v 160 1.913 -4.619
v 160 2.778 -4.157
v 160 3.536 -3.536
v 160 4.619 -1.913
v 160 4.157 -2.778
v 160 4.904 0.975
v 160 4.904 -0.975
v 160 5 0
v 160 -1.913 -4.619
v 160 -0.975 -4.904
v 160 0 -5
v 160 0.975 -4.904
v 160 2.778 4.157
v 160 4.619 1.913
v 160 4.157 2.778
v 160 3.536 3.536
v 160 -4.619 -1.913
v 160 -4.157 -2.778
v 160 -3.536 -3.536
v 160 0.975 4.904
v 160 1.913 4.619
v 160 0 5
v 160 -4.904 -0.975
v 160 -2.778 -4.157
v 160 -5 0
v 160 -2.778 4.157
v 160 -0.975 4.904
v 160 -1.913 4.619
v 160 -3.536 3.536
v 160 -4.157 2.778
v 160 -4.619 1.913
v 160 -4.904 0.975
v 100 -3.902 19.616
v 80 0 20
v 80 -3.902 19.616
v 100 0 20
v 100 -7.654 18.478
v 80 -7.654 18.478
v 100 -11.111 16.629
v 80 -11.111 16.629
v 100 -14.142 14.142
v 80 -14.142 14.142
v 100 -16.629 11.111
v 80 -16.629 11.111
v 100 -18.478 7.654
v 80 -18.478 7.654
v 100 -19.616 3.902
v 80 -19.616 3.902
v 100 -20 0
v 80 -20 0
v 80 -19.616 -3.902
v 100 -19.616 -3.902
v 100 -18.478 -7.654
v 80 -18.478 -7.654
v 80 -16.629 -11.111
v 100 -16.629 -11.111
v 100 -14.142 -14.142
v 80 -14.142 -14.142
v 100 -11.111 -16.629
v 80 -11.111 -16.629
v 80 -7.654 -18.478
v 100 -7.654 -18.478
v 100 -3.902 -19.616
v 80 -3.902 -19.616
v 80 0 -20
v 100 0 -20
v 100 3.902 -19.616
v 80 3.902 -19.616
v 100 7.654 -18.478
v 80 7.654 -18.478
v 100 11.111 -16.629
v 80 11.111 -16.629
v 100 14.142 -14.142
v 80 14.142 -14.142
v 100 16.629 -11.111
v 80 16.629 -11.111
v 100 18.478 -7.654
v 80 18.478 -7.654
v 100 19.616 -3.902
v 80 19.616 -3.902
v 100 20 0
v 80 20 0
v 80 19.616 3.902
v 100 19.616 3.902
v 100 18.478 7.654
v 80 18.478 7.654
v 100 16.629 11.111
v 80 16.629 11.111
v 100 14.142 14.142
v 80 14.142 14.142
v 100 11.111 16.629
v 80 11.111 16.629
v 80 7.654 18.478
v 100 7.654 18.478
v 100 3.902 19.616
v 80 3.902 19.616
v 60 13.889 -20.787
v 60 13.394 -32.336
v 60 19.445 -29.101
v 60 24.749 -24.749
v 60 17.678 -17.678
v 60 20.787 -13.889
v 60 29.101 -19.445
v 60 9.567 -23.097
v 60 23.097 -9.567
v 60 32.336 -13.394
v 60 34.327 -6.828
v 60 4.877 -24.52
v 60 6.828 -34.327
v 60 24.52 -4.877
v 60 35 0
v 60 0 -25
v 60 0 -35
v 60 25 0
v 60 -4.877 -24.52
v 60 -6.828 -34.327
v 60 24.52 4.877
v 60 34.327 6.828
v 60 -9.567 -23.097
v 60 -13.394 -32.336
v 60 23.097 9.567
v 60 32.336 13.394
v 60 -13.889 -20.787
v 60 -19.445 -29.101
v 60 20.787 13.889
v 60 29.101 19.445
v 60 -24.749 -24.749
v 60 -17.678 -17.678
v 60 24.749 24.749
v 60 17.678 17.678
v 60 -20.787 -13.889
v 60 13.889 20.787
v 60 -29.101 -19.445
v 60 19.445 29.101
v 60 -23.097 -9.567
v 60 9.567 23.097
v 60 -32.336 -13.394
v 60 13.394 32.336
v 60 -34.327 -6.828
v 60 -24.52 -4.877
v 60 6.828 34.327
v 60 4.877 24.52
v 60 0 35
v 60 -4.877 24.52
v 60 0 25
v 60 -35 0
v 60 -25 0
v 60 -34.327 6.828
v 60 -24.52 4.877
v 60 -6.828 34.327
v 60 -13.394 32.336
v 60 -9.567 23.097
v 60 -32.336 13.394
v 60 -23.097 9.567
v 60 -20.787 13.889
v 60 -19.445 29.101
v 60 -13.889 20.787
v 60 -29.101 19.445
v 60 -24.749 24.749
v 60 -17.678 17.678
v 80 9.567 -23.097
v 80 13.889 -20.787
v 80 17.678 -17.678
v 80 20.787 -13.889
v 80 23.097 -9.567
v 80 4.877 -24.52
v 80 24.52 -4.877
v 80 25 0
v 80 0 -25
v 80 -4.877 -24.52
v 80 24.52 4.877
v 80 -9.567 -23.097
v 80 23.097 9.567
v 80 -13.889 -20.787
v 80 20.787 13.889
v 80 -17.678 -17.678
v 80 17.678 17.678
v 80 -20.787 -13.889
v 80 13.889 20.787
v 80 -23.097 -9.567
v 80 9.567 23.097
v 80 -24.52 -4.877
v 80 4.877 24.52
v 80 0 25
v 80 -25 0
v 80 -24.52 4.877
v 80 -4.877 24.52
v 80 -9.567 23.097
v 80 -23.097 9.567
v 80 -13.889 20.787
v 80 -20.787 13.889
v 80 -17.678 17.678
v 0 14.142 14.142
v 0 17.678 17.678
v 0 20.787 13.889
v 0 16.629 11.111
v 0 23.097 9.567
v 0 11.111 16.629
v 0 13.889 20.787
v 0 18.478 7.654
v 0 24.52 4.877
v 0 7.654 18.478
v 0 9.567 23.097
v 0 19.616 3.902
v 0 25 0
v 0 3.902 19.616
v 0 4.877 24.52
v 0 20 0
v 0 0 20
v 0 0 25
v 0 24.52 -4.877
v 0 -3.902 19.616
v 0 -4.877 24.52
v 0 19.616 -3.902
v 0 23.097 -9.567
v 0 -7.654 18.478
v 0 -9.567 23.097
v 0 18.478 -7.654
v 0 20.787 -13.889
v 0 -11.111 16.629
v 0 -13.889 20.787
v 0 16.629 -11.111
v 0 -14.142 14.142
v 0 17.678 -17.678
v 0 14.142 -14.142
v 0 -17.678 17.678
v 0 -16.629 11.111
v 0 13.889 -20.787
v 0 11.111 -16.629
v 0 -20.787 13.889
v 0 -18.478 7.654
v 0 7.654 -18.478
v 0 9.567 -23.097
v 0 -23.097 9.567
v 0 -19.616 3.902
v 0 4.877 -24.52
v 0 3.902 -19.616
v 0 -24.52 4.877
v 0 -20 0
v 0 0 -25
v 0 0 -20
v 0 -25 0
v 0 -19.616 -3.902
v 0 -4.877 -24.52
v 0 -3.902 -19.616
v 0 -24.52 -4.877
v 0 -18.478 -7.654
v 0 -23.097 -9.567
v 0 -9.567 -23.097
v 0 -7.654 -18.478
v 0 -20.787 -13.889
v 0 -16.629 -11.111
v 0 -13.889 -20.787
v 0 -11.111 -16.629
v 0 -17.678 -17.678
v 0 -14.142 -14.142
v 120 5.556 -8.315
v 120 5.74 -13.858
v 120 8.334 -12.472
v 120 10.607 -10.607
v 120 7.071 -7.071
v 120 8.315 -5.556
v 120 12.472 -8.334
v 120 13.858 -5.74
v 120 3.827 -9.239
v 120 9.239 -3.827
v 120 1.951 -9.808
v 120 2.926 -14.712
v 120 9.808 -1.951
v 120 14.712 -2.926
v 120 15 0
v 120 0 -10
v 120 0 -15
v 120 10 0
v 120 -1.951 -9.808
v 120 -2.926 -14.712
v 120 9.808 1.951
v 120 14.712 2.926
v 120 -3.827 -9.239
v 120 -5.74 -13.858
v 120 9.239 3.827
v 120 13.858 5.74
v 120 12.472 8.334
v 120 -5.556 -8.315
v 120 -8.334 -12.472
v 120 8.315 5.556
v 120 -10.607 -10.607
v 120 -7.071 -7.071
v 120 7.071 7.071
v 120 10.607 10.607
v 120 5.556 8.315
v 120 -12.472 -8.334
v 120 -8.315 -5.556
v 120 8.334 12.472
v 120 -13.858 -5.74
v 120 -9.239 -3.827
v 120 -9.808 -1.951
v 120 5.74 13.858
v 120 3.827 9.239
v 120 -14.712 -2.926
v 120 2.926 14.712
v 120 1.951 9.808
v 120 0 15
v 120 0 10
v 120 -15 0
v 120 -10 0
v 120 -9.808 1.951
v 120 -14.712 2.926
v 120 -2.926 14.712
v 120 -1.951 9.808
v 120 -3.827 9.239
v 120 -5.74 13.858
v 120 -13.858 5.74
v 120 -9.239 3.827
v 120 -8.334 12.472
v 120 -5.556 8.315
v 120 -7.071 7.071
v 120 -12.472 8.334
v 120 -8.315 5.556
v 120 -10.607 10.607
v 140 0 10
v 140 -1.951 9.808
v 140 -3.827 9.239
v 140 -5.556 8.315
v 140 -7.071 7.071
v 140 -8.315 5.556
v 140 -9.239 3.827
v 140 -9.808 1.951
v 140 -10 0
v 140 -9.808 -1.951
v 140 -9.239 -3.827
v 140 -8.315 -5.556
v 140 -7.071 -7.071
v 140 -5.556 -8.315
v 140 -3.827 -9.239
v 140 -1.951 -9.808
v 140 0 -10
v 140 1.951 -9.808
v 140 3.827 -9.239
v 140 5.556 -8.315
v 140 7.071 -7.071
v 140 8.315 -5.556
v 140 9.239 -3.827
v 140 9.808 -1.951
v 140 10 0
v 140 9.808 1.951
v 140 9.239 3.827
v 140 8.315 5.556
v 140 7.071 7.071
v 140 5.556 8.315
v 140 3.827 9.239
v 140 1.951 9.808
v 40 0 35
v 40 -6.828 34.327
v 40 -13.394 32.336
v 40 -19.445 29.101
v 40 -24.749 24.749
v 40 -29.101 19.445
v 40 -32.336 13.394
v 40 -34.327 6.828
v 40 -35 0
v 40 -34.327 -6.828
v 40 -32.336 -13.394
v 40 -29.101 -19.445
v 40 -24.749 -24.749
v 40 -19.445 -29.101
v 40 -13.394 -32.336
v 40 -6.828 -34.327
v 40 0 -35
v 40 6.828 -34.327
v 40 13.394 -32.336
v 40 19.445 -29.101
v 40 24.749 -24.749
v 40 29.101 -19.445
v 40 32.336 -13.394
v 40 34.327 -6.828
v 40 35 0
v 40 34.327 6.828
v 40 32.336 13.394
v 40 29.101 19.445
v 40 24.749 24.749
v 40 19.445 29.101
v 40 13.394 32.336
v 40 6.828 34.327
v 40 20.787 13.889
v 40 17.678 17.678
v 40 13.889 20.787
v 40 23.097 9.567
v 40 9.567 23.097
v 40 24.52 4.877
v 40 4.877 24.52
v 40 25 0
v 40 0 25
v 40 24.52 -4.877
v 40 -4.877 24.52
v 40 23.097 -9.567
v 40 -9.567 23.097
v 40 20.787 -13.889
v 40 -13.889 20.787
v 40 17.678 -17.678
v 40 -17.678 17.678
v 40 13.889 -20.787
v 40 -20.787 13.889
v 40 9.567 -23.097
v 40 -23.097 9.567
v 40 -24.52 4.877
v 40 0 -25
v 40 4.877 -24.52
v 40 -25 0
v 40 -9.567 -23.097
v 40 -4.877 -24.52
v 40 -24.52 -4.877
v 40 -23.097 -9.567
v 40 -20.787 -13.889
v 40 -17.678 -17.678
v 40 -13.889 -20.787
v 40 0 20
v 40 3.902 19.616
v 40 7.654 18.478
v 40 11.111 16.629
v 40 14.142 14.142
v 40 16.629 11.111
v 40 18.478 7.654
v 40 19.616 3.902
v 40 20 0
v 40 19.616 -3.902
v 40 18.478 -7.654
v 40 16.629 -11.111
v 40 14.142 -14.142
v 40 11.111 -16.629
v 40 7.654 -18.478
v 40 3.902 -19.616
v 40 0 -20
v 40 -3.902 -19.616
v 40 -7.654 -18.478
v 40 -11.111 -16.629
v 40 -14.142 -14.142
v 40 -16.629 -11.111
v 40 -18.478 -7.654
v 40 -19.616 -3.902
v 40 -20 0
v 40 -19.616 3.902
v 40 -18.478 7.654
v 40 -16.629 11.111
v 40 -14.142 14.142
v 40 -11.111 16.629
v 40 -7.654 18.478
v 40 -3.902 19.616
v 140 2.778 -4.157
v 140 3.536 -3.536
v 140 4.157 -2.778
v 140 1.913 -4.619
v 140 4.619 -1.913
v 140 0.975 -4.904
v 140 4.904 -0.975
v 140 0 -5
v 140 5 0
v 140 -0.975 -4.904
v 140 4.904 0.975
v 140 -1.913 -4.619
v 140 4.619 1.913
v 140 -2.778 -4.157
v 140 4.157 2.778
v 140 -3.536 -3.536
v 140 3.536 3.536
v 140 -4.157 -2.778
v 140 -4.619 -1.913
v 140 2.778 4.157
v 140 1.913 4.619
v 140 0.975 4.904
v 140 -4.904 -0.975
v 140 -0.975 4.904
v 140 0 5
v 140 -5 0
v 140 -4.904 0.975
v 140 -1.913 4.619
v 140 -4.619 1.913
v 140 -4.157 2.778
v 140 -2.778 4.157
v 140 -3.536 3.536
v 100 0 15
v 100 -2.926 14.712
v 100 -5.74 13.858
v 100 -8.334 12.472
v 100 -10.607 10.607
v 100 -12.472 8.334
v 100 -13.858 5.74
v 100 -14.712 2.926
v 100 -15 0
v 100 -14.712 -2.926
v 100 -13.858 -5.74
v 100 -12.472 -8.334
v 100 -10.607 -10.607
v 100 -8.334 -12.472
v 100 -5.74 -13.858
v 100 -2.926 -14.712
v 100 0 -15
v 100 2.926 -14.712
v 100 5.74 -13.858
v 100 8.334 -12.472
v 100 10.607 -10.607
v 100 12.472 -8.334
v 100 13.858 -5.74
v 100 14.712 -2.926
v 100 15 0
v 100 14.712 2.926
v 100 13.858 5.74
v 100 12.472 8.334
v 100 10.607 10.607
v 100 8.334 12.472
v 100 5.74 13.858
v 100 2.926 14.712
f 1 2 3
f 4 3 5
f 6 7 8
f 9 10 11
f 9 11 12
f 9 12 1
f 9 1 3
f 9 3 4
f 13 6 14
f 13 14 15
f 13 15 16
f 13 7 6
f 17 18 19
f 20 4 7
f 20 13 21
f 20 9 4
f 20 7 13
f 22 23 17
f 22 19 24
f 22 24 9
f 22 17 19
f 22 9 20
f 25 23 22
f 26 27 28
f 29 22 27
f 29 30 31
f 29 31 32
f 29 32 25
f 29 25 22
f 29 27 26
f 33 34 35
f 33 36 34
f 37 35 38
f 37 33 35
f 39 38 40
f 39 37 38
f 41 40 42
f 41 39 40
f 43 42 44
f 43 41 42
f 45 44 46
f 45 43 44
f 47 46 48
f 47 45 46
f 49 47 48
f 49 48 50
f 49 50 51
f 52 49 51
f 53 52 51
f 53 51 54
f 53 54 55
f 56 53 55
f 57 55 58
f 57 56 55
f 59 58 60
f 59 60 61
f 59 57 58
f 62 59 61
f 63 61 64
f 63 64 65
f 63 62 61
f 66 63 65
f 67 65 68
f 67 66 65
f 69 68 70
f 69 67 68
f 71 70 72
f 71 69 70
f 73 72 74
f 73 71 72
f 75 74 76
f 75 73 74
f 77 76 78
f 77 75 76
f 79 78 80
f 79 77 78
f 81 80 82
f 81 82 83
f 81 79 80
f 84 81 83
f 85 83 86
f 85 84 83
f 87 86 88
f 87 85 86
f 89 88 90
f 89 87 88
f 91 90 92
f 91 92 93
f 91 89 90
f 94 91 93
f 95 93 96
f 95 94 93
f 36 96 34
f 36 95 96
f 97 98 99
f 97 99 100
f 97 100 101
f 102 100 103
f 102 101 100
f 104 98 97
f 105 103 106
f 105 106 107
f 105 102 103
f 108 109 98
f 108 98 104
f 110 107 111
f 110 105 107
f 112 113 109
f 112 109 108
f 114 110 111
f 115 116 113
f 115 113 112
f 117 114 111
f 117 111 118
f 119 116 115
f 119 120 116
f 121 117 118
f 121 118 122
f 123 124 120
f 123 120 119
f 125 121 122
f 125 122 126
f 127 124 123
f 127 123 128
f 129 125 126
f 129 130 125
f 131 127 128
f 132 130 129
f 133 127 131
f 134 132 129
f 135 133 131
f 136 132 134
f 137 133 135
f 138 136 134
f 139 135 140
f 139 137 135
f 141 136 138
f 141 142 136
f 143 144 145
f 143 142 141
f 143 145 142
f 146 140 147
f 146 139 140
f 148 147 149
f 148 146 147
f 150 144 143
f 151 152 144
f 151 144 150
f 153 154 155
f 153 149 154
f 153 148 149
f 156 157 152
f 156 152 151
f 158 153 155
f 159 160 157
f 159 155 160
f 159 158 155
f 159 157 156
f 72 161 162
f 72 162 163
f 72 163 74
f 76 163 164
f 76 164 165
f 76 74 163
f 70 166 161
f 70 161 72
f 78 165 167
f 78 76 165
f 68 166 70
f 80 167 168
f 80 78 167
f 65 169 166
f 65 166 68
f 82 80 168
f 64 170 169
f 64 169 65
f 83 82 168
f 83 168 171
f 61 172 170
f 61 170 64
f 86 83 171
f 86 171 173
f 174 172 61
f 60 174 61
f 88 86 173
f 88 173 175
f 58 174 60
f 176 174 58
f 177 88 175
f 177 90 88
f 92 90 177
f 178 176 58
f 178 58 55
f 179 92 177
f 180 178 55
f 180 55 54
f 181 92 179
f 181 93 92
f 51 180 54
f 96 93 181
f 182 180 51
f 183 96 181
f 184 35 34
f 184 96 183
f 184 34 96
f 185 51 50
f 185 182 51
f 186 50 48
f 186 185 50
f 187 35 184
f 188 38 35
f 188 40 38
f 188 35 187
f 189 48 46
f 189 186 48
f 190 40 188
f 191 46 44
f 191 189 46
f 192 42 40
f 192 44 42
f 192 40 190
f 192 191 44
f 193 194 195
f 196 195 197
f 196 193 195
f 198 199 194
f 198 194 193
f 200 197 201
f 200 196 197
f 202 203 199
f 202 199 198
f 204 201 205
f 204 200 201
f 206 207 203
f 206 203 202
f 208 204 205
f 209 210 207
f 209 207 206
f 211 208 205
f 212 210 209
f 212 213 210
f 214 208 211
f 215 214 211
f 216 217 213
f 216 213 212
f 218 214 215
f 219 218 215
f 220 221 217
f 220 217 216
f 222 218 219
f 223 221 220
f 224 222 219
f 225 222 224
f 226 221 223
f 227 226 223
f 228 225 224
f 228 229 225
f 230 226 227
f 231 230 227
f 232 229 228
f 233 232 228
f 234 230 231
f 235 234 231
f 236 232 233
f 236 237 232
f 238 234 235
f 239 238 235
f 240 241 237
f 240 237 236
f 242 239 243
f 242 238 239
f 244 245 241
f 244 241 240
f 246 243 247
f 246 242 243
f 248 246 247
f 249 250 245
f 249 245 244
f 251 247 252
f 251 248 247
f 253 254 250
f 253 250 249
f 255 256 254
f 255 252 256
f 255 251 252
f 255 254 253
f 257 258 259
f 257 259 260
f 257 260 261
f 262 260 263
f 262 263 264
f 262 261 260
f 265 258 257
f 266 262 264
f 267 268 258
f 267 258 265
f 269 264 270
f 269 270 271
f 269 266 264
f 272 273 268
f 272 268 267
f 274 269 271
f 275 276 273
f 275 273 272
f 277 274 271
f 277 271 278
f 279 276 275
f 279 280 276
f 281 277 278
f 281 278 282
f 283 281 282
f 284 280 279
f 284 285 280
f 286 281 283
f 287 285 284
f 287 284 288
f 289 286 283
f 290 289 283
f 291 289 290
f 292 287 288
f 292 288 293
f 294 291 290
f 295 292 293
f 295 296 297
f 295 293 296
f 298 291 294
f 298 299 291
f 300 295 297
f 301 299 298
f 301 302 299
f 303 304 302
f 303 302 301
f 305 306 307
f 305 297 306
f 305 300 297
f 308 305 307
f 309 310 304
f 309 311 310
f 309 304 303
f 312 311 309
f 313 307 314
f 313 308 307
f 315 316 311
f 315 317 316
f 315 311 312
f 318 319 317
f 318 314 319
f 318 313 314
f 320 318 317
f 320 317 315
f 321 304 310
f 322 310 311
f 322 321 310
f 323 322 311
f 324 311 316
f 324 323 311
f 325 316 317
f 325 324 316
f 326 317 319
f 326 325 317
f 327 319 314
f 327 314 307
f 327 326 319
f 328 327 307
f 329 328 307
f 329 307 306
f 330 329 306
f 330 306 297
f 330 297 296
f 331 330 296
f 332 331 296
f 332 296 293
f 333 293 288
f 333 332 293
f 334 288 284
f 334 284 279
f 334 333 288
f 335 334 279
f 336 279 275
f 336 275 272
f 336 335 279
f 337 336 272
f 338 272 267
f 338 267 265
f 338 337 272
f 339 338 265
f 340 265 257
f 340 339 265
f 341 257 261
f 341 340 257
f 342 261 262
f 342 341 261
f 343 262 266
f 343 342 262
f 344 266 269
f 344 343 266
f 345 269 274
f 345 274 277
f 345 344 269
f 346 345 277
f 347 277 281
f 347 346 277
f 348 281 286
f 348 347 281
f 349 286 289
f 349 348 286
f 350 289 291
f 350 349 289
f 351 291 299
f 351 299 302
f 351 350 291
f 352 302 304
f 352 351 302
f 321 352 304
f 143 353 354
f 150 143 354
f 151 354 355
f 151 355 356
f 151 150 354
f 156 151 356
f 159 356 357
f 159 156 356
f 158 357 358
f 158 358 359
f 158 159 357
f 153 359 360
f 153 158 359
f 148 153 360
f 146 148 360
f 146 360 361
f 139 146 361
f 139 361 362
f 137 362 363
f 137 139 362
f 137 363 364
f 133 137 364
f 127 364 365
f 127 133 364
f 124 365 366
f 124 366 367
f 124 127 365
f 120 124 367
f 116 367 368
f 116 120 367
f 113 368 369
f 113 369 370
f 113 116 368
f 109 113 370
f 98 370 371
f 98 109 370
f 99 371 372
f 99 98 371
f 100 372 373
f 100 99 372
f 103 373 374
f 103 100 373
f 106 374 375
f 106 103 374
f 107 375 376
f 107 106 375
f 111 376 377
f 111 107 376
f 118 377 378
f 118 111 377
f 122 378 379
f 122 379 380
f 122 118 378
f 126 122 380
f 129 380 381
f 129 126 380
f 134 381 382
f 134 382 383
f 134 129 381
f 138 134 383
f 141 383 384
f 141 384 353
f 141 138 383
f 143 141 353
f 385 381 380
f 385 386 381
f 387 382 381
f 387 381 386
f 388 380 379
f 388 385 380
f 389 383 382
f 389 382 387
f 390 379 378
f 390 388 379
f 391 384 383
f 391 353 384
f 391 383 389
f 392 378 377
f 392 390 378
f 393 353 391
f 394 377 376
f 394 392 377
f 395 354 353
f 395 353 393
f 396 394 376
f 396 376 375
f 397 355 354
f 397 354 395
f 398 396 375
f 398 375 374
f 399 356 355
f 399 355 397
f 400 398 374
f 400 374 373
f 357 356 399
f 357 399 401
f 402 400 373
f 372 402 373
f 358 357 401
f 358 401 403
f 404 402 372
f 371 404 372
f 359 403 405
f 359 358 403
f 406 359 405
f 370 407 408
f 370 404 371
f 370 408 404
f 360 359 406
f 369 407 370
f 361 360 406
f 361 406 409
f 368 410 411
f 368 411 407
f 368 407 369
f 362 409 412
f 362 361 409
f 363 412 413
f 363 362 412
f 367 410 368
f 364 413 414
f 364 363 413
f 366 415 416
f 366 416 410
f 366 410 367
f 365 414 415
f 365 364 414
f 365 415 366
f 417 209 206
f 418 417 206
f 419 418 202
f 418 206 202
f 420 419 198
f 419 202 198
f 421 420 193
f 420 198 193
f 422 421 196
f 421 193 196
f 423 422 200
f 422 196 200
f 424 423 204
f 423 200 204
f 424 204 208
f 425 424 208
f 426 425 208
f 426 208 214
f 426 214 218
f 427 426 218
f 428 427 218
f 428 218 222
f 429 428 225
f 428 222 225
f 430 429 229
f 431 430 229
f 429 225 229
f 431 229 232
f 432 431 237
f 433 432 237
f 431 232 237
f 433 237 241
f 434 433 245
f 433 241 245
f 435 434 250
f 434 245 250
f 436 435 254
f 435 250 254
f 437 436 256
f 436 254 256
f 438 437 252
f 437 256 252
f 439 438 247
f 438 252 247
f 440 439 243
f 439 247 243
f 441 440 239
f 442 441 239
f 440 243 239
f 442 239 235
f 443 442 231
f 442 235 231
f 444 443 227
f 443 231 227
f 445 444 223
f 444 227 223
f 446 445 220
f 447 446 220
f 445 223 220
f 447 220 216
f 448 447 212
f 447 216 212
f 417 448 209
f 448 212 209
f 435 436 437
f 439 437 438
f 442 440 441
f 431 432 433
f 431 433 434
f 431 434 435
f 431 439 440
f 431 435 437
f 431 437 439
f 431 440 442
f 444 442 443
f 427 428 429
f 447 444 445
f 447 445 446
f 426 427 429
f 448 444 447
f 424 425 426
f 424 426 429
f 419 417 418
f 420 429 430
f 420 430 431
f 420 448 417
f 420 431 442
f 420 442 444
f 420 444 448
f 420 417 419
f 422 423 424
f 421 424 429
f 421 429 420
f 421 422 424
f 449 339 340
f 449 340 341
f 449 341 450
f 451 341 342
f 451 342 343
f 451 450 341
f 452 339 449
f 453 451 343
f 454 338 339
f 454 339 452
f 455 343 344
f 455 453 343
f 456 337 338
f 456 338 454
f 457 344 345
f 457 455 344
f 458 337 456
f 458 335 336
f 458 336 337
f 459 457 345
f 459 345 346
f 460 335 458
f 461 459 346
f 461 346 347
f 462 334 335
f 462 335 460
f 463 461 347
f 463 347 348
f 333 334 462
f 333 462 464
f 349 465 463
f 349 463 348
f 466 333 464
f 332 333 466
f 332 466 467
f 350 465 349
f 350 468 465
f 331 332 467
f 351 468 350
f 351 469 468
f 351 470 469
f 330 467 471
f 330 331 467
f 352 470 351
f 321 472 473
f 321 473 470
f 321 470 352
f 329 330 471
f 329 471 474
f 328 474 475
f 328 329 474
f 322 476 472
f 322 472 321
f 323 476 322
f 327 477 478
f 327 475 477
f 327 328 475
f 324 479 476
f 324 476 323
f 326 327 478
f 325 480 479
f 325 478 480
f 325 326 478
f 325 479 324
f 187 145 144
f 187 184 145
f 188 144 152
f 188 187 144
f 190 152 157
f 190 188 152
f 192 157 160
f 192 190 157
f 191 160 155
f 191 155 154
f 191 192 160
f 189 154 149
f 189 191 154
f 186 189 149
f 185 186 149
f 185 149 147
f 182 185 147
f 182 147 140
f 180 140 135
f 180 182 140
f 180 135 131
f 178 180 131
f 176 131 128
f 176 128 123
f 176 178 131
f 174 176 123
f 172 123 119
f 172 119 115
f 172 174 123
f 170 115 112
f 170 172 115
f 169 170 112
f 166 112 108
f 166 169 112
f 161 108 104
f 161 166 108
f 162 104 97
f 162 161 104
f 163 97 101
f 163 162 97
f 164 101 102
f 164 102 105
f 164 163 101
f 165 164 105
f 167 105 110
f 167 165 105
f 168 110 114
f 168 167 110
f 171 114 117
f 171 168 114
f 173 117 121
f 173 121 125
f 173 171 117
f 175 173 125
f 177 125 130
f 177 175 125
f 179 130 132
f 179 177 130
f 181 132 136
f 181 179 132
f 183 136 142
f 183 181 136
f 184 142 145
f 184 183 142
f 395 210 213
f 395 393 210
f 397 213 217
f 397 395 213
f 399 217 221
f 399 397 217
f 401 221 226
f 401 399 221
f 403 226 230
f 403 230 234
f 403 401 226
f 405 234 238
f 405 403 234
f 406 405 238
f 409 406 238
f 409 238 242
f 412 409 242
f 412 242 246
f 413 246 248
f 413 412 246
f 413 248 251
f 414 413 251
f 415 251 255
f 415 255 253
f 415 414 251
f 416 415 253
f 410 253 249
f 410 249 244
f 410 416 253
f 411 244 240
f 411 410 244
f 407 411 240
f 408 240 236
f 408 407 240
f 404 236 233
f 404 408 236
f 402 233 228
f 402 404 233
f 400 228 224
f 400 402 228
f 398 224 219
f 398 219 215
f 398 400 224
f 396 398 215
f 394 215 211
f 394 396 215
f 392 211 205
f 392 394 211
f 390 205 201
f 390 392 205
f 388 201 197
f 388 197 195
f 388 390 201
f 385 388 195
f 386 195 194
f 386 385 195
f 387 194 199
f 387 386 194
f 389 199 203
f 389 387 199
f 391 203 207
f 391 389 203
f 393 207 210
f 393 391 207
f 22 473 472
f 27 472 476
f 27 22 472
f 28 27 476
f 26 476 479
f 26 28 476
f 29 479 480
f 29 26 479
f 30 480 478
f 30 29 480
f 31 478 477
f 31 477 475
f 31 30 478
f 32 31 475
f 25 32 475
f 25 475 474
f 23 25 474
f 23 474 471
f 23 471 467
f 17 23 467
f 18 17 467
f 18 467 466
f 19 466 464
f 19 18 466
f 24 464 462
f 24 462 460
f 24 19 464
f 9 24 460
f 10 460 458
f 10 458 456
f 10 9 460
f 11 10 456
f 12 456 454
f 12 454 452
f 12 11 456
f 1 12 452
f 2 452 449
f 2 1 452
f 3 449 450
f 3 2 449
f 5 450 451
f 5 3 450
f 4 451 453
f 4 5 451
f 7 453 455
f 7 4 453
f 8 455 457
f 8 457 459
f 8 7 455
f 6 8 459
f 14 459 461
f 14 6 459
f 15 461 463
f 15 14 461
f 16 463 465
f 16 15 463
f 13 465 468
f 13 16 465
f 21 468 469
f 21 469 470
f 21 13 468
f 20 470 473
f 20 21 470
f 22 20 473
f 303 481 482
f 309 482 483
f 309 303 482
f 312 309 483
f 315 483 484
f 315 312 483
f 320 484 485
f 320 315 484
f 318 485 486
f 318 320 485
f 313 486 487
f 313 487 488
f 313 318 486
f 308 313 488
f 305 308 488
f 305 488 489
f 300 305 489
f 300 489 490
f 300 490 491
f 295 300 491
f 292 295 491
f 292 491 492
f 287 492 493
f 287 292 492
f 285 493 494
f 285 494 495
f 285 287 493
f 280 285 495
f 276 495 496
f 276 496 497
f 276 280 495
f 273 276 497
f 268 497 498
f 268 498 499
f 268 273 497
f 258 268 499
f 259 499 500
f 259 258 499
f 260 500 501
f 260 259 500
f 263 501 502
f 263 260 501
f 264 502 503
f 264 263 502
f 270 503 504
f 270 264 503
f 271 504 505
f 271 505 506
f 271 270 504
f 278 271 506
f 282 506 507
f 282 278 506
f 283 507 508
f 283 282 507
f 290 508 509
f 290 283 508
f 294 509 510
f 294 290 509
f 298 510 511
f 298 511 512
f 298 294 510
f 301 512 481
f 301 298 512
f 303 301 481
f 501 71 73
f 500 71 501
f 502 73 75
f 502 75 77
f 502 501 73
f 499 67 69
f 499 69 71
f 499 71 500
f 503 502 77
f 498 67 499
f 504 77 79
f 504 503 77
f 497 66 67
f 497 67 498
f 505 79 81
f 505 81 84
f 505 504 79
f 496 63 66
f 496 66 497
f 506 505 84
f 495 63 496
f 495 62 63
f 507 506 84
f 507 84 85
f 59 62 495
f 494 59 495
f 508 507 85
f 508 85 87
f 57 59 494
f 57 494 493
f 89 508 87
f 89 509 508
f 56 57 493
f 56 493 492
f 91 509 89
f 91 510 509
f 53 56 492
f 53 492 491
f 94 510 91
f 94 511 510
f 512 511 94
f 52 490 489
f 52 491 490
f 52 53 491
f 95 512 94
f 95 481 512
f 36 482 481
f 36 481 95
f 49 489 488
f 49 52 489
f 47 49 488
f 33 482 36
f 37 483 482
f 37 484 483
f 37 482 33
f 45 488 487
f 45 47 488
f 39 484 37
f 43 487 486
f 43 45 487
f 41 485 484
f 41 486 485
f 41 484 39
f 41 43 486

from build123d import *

# Parameters (mm, degrees)
SKETCH2_R          = 20
CUT_EXTRUDE1_DEPTH = 40


with BuildPart() as part:
    # Sketch1 → Revolve2 (revolve)
    with BuildSketch(Plane.XY, mode=Mode.PRIVATE) as revolve2_sk:
        Polygon((0, 0), (0, 25), (40, 25), (40, 35), (60, 35), (60, 25), (80, 25), (80, 20), (100, 20), (100, 15), (120, 15), (120, 10), (140, 10), (140, 5), (160, 5), (160, 0), align=None)
    revolve(revolve2_sk.sketch.rotate(Axis((0, 0, 0), (1, 0, 0)), 90), axis=Axis((0, 0, 0), (1, 0, 0)))  # turned: the seam where the file's is

    # Sketch2 → Cut-Extrude1 (cut)
    with BuildSketch(Plane.ZY):
        Circle(SKETCH2_R)
    extrude(amount=-CUT_EXTRUDE1_DEPTH, mode=Mode.SUBTRACT)


solid = part.part
